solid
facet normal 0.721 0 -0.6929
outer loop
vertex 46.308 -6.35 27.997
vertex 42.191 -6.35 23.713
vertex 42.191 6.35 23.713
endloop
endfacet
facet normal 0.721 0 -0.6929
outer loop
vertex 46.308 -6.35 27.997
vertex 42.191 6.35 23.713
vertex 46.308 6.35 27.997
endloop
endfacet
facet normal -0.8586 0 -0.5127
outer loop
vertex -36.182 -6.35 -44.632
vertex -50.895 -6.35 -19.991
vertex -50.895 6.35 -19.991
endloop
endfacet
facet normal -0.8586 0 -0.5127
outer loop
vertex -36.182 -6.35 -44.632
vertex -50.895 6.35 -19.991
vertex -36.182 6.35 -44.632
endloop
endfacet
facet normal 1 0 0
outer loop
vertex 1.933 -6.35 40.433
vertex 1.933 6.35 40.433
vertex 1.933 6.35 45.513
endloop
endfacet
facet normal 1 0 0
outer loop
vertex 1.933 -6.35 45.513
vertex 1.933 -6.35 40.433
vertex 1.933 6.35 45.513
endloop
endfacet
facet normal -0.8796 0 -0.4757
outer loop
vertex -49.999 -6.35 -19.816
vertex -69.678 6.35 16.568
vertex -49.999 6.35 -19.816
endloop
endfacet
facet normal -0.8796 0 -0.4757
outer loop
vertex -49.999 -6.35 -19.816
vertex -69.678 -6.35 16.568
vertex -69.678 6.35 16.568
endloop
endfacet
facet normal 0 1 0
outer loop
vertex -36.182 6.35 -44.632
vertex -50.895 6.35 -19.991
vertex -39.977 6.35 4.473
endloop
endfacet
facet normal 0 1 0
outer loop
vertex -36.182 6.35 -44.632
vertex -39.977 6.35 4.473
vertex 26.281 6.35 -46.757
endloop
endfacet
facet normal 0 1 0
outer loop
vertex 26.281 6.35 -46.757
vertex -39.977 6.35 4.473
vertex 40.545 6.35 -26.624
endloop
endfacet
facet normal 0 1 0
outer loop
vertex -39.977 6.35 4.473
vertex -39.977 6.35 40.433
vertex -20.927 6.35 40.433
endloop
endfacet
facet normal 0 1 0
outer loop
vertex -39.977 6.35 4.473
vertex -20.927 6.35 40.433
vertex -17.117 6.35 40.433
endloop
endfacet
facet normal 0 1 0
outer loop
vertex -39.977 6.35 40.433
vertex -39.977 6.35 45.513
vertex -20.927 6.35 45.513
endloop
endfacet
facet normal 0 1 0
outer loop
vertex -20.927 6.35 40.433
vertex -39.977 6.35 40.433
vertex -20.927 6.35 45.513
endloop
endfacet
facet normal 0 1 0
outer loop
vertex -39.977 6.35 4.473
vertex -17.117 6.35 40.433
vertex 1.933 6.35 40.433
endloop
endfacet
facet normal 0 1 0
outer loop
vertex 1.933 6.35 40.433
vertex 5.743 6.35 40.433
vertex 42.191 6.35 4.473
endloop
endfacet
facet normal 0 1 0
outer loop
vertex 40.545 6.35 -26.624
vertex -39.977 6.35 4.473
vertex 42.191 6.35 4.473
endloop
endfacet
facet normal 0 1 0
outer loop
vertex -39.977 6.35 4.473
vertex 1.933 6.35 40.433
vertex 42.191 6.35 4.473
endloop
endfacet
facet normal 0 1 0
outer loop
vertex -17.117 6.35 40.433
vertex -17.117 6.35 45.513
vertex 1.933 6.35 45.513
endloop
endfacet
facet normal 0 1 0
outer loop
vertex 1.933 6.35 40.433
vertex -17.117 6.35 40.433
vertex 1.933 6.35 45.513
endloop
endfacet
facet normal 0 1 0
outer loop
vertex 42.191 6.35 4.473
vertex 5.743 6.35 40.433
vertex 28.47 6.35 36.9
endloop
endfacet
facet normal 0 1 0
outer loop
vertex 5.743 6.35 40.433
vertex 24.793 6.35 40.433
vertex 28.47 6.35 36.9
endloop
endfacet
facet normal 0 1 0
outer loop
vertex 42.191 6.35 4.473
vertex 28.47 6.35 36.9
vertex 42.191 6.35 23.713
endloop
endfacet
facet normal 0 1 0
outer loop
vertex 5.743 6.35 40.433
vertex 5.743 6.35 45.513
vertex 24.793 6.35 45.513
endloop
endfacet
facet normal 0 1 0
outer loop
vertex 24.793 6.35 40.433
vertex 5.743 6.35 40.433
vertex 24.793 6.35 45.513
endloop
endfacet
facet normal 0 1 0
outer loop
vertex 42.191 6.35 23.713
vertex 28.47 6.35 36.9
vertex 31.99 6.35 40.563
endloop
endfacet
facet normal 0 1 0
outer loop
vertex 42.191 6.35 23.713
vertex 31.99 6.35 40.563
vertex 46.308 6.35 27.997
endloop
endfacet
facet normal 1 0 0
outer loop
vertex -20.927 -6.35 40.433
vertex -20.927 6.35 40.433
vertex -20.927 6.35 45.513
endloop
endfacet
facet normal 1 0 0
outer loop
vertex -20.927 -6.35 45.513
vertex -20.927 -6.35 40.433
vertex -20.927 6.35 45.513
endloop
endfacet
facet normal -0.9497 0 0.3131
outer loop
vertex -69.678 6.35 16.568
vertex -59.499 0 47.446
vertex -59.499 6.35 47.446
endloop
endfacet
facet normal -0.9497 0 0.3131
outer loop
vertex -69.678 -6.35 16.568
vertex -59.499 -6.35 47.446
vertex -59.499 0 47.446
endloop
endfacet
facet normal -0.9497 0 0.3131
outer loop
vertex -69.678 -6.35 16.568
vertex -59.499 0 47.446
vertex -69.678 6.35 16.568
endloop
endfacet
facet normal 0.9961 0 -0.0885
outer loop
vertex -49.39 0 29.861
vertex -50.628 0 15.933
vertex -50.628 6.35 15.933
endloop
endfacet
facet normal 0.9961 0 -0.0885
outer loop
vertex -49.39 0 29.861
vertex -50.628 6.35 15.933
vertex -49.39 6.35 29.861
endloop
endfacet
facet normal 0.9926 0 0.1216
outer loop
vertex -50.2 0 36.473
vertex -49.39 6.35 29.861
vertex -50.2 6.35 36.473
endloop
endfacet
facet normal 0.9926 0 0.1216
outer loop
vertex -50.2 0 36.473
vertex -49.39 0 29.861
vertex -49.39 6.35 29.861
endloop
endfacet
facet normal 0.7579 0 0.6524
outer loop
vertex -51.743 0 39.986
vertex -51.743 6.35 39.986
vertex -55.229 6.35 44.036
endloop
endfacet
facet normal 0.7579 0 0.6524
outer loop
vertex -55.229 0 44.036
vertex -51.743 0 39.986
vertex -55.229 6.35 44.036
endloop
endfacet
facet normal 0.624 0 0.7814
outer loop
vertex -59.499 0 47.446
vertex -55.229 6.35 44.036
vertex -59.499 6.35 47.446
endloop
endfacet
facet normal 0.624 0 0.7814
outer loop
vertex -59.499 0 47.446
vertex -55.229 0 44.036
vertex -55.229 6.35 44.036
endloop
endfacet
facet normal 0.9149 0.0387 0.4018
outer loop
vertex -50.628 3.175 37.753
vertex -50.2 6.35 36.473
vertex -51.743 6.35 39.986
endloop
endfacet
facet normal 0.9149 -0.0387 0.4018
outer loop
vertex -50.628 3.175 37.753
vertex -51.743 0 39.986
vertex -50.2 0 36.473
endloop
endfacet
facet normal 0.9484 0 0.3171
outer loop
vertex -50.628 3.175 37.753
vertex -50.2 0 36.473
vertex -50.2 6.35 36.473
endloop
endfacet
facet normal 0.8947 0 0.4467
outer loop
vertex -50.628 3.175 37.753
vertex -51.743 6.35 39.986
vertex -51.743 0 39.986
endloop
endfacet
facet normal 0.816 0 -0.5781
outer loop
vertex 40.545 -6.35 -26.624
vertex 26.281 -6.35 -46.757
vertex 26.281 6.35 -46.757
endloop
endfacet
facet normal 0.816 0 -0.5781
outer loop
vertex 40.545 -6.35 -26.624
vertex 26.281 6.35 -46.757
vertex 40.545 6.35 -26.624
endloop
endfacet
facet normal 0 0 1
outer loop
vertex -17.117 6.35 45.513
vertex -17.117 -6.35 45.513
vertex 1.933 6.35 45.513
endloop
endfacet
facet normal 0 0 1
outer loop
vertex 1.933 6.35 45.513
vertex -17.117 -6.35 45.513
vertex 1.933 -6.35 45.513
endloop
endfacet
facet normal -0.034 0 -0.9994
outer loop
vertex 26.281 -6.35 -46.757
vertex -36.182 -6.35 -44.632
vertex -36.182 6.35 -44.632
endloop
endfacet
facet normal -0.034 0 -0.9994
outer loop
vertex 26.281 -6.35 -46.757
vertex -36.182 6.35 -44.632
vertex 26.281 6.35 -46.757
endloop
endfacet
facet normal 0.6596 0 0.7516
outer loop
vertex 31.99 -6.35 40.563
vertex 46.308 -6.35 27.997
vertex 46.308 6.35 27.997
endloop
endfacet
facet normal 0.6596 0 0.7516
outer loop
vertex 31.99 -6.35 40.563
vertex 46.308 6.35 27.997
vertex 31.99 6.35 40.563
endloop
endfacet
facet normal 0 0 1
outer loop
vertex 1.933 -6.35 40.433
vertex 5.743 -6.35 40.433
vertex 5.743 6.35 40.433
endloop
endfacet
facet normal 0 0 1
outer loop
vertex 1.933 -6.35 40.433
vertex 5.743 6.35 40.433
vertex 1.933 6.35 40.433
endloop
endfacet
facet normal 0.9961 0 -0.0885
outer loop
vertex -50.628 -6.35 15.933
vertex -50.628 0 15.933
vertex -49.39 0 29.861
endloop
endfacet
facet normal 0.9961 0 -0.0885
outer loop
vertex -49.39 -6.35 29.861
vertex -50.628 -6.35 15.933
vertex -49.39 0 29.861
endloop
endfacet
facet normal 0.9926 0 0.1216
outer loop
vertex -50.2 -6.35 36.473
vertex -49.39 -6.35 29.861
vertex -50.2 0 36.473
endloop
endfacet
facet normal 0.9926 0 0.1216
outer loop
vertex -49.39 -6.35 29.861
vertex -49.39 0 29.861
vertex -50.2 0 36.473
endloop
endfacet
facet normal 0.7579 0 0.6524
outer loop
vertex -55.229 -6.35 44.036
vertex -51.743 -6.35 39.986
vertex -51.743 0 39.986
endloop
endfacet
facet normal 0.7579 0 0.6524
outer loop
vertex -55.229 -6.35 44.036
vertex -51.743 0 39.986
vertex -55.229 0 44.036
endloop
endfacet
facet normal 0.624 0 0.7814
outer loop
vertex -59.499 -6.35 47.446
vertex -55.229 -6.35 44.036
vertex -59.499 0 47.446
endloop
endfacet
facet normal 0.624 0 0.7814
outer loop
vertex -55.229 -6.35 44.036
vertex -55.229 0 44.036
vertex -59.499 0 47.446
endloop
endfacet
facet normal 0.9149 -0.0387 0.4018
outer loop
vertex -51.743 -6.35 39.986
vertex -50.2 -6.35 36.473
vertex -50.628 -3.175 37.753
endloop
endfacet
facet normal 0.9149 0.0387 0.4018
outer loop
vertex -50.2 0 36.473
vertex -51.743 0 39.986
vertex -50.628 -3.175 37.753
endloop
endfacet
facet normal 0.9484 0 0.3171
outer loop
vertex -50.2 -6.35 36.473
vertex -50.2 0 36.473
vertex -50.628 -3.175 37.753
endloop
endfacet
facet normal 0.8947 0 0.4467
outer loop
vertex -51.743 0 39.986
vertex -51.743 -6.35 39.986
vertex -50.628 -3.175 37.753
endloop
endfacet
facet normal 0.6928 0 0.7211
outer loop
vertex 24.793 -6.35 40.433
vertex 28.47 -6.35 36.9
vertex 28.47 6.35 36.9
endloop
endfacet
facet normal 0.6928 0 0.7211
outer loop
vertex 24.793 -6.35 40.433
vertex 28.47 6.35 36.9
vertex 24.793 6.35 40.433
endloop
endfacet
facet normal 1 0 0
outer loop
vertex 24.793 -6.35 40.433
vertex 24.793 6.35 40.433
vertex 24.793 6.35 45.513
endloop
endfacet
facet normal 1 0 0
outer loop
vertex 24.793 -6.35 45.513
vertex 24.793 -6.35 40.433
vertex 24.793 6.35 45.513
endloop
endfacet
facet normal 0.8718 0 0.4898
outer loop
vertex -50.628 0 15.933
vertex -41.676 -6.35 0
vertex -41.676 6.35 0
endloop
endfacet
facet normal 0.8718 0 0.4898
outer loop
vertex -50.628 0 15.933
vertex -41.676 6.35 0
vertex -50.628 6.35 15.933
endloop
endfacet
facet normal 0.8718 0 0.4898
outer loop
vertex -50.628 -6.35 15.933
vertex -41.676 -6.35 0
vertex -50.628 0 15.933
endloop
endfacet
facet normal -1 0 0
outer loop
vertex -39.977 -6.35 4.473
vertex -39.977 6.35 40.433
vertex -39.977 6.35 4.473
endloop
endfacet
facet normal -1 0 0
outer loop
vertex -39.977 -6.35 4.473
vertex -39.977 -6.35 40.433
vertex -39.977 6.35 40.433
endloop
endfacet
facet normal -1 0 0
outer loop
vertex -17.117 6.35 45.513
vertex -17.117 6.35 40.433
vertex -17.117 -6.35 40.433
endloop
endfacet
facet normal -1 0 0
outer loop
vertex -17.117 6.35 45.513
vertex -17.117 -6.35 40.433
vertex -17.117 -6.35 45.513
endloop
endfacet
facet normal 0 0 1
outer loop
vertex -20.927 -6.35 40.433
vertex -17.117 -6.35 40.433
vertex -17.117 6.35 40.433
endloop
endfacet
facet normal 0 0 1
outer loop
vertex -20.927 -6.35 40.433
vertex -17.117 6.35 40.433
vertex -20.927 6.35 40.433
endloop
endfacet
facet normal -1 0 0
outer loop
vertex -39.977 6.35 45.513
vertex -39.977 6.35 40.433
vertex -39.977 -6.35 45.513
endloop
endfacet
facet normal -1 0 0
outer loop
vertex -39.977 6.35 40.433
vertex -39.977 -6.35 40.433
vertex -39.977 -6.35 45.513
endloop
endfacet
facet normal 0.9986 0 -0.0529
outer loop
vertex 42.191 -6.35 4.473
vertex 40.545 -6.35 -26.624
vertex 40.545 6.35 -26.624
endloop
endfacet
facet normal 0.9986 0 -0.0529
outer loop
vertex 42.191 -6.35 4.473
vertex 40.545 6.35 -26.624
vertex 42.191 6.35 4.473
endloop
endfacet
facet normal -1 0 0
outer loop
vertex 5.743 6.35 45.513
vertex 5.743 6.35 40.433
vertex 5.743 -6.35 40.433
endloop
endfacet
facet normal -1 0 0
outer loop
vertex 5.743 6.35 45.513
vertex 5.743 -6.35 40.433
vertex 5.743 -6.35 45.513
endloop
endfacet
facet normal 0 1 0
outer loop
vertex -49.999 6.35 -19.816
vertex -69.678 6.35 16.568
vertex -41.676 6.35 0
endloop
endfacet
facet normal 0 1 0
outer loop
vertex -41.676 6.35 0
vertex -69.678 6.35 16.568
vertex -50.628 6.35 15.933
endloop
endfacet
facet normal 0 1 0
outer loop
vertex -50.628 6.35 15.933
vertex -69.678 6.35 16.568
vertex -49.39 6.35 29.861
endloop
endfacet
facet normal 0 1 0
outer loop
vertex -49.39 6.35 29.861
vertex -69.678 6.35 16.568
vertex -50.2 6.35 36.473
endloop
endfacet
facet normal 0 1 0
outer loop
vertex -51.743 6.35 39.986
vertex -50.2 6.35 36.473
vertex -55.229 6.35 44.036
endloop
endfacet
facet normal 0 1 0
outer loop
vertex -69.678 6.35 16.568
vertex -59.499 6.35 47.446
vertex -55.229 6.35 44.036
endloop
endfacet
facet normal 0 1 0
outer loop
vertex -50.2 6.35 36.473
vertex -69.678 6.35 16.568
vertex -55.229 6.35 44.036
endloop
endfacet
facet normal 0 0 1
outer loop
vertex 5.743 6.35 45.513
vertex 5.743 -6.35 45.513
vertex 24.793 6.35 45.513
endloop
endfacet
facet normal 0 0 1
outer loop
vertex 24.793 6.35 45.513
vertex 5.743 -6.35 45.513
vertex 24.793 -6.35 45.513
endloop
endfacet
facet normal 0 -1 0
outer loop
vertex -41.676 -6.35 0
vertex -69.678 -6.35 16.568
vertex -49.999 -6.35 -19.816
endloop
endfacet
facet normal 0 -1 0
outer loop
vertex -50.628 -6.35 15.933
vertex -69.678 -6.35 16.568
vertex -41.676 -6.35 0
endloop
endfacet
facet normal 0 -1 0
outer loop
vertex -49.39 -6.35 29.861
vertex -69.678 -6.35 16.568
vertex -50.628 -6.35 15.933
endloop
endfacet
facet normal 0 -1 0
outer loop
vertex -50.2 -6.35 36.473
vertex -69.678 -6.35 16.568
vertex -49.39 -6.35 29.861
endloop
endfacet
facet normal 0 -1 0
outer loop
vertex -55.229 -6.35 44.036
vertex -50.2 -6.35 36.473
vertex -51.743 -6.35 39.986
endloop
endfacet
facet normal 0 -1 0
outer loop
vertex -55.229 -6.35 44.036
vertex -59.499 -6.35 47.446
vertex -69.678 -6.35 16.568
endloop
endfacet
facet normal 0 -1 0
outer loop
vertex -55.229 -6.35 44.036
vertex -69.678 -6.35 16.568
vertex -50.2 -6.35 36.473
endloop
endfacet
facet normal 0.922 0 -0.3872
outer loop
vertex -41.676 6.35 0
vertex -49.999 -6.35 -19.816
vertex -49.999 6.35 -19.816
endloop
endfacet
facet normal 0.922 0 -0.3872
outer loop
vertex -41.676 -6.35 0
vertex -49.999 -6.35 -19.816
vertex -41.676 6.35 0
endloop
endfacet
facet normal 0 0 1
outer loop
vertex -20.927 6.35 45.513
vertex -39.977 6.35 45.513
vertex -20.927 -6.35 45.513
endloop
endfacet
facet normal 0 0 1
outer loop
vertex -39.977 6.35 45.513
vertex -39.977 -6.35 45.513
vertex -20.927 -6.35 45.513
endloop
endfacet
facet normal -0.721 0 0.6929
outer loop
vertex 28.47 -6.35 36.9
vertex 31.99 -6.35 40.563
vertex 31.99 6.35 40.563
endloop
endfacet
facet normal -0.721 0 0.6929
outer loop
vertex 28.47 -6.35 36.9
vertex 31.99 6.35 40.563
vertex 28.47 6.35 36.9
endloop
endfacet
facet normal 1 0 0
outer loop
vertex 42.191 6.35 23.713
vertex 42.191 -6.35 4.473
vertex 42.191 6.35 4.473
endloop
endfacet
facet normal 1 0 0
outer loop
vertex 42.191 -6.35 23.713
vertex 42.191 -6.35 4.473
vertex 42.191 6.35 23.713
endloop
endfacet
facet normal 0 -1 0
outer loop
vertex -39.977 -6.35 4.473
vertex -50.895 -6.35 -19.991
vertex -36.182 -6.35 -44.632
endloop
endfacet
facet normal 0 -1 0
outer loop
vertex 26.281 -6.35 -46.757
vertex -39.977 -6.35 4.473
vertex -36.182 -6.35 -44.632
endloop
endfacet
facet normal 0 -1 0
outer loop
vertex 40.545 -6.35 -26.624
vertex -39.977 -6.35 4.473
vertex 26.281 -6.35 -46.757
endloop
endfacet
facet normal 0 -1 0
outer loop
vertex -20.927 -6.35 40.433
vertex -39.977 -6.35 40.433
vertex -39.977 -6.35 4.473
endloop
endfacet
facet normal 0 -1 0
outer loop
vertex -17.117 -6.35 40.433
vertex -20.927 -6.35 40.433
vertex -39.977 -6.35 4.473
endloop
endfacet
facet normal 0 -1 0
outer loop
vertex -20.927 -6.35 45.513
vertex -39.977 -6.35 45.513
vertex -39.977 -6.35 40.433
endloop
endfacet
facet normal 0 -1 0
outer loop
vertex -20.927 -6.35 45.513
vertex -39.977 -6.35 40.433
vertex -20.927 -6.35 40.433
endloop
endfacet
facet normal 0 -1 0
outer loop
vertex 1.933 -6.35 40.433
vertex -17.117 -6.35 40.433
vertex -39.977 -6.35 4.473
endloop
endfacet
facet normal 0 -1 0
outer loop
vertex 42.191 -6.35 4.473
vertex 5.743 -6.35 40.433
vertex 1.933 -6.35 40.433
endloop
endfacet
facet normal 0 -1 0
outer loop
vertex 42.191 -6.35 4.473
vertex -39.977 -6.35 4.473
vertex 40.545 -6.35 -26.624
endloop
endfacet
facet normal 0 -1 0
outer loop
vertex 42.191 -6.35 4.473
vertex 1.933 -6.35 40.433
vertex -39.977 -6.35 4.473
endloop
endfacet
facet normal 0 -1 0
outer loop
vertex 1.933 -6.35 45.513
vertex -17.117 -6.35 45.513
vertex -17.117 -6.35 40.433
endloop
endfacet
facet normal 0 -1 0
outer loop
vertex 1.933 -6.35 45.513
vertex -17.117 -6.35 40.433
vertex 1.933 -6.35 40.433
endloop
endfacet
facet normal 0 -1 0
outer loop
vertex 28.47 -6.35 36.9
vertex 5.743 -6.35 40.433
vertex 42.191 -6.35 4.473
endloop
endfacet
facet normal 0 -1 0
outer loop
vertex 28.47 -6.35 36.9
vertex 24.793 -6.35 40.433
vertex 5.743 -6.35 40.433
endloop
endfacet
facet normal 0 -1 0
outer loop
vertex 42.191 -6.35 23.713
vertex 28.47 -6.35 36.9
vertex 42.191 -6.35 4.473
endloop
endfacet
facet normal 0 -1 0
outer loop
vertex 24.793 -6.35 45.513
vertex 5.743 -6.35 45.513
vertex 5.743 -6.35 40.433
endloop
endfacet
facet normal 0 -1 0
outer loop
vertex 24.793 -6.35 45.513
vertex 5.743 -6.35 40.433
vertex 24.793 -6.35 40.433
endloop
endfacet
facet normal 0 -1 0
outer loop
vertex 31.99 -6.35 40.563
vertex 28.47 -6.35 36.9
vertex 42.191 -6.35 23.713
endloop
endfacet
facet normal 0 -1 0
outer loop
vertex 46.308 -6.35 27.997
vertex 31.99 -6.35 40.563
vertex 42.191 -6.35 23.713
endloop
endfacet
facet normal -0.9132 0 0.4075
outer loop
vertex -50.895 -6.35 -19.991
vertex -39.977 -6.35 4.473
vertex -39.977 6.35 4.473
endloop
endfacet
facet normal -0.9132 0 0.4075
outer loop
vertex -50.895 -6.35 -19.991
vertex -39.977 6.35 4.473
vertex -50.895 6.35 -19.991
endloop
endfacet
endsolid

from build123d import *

# Parameters (mm, degrees)
F0_W     = 82.1682992279
F0_H     = 19.2402615459
F0_W_2   = 19.05
F0_H_2   = 5.08
F1_DEPTH = 6.35
F3_DEPTH = 6.35


with BuildPart() as f1:
    # F0 (on Front) → F1 (new body, symmetric)
    with BuildSketch(Plane.XZ):
        Polygon((-39.9771575426, 40.4332687695), (-39.9771575426, 23.7133380287), (42.1911416853, 23.7133380287), (28.4696710712, 36.8998015631), (24.7928424574, 40.4332687695), (5.7428424574, 40.4332687695), (1.9328424574, 40.4332687695), (-17.1171575426, 40.4332687695), (-20.9271575426, 40.4332687695), align=None)
        with Locations((1.1069920714, 14.0932072558)):
            Rectangle(F0_W, F0_H)
        Polygon((28.4696710712, 36.8998015631), (42.1911416853, 23.7133380287), (46.3075631456, 27.9967727764), (31.9896564904, 40.5626014006), align=None)
        Polygon((42.1911416853, 4.4730764828), (-39.9771575426, 4.4730764828), (40.5453704298, -26.6239494085), align=None)
        Polygon((40.5453704298, -26.6239494085), (-39.9771575426, 4.4730764828), (-50.8951619267, -19.9909545481), (-36.1816734076, -44.6315854788), (26.2808166444, -46.7572510242), align=None)
        with Locations((-30.4521575426, 42.9732687695)):
            Rectangle(F0_W_2, F0_H_2)
        with Locations((15.2678424574, 42.9732687695)):
            Rectangle(F0_W_2, F0_H_2)
        with Locations((-7.5921575426, 42.9732687695)):
            Rectangle(F0_W_2, F0_H_2)
    extrude(amount=F1_DEPTH, both=True)


with BuildPart() as f3:
    # F2 (on Front) → F3 (new body, symmetric)
    with BuildSketch(Plane.XZ):
        with BuildLine():
            Line((-69.6777667551, 16.5681660283), (-49.9989315758, -19.8159819271))
            Line((-49.9989315758, -19.8159819271), (-41.6758551755, 0))
            Line((-41.6758551755, 0), (-50.6277667551, 15.9329831097))
            add(Edge.make_bspline(
                [(-50.6277667551, 15.9329831097), (-49.5549233414, 24.0818436429), (-47.6495421422, 38.5543057529), (-55.8960921603, 44.7421777122), (-59.4993419945, 47.4459081888)],
                knots=[0, 0, 0, 0, 0.5630597248, 1, 1, 1, 1], degree=3))
            Line((-59.4993419945, 47.4459081888), (-69.6777667551, 16.5681660283))
        make_face()
    extrude(amount=F3_DEPTH, both=True)


solid = Compound([f1.part, f3.part])
